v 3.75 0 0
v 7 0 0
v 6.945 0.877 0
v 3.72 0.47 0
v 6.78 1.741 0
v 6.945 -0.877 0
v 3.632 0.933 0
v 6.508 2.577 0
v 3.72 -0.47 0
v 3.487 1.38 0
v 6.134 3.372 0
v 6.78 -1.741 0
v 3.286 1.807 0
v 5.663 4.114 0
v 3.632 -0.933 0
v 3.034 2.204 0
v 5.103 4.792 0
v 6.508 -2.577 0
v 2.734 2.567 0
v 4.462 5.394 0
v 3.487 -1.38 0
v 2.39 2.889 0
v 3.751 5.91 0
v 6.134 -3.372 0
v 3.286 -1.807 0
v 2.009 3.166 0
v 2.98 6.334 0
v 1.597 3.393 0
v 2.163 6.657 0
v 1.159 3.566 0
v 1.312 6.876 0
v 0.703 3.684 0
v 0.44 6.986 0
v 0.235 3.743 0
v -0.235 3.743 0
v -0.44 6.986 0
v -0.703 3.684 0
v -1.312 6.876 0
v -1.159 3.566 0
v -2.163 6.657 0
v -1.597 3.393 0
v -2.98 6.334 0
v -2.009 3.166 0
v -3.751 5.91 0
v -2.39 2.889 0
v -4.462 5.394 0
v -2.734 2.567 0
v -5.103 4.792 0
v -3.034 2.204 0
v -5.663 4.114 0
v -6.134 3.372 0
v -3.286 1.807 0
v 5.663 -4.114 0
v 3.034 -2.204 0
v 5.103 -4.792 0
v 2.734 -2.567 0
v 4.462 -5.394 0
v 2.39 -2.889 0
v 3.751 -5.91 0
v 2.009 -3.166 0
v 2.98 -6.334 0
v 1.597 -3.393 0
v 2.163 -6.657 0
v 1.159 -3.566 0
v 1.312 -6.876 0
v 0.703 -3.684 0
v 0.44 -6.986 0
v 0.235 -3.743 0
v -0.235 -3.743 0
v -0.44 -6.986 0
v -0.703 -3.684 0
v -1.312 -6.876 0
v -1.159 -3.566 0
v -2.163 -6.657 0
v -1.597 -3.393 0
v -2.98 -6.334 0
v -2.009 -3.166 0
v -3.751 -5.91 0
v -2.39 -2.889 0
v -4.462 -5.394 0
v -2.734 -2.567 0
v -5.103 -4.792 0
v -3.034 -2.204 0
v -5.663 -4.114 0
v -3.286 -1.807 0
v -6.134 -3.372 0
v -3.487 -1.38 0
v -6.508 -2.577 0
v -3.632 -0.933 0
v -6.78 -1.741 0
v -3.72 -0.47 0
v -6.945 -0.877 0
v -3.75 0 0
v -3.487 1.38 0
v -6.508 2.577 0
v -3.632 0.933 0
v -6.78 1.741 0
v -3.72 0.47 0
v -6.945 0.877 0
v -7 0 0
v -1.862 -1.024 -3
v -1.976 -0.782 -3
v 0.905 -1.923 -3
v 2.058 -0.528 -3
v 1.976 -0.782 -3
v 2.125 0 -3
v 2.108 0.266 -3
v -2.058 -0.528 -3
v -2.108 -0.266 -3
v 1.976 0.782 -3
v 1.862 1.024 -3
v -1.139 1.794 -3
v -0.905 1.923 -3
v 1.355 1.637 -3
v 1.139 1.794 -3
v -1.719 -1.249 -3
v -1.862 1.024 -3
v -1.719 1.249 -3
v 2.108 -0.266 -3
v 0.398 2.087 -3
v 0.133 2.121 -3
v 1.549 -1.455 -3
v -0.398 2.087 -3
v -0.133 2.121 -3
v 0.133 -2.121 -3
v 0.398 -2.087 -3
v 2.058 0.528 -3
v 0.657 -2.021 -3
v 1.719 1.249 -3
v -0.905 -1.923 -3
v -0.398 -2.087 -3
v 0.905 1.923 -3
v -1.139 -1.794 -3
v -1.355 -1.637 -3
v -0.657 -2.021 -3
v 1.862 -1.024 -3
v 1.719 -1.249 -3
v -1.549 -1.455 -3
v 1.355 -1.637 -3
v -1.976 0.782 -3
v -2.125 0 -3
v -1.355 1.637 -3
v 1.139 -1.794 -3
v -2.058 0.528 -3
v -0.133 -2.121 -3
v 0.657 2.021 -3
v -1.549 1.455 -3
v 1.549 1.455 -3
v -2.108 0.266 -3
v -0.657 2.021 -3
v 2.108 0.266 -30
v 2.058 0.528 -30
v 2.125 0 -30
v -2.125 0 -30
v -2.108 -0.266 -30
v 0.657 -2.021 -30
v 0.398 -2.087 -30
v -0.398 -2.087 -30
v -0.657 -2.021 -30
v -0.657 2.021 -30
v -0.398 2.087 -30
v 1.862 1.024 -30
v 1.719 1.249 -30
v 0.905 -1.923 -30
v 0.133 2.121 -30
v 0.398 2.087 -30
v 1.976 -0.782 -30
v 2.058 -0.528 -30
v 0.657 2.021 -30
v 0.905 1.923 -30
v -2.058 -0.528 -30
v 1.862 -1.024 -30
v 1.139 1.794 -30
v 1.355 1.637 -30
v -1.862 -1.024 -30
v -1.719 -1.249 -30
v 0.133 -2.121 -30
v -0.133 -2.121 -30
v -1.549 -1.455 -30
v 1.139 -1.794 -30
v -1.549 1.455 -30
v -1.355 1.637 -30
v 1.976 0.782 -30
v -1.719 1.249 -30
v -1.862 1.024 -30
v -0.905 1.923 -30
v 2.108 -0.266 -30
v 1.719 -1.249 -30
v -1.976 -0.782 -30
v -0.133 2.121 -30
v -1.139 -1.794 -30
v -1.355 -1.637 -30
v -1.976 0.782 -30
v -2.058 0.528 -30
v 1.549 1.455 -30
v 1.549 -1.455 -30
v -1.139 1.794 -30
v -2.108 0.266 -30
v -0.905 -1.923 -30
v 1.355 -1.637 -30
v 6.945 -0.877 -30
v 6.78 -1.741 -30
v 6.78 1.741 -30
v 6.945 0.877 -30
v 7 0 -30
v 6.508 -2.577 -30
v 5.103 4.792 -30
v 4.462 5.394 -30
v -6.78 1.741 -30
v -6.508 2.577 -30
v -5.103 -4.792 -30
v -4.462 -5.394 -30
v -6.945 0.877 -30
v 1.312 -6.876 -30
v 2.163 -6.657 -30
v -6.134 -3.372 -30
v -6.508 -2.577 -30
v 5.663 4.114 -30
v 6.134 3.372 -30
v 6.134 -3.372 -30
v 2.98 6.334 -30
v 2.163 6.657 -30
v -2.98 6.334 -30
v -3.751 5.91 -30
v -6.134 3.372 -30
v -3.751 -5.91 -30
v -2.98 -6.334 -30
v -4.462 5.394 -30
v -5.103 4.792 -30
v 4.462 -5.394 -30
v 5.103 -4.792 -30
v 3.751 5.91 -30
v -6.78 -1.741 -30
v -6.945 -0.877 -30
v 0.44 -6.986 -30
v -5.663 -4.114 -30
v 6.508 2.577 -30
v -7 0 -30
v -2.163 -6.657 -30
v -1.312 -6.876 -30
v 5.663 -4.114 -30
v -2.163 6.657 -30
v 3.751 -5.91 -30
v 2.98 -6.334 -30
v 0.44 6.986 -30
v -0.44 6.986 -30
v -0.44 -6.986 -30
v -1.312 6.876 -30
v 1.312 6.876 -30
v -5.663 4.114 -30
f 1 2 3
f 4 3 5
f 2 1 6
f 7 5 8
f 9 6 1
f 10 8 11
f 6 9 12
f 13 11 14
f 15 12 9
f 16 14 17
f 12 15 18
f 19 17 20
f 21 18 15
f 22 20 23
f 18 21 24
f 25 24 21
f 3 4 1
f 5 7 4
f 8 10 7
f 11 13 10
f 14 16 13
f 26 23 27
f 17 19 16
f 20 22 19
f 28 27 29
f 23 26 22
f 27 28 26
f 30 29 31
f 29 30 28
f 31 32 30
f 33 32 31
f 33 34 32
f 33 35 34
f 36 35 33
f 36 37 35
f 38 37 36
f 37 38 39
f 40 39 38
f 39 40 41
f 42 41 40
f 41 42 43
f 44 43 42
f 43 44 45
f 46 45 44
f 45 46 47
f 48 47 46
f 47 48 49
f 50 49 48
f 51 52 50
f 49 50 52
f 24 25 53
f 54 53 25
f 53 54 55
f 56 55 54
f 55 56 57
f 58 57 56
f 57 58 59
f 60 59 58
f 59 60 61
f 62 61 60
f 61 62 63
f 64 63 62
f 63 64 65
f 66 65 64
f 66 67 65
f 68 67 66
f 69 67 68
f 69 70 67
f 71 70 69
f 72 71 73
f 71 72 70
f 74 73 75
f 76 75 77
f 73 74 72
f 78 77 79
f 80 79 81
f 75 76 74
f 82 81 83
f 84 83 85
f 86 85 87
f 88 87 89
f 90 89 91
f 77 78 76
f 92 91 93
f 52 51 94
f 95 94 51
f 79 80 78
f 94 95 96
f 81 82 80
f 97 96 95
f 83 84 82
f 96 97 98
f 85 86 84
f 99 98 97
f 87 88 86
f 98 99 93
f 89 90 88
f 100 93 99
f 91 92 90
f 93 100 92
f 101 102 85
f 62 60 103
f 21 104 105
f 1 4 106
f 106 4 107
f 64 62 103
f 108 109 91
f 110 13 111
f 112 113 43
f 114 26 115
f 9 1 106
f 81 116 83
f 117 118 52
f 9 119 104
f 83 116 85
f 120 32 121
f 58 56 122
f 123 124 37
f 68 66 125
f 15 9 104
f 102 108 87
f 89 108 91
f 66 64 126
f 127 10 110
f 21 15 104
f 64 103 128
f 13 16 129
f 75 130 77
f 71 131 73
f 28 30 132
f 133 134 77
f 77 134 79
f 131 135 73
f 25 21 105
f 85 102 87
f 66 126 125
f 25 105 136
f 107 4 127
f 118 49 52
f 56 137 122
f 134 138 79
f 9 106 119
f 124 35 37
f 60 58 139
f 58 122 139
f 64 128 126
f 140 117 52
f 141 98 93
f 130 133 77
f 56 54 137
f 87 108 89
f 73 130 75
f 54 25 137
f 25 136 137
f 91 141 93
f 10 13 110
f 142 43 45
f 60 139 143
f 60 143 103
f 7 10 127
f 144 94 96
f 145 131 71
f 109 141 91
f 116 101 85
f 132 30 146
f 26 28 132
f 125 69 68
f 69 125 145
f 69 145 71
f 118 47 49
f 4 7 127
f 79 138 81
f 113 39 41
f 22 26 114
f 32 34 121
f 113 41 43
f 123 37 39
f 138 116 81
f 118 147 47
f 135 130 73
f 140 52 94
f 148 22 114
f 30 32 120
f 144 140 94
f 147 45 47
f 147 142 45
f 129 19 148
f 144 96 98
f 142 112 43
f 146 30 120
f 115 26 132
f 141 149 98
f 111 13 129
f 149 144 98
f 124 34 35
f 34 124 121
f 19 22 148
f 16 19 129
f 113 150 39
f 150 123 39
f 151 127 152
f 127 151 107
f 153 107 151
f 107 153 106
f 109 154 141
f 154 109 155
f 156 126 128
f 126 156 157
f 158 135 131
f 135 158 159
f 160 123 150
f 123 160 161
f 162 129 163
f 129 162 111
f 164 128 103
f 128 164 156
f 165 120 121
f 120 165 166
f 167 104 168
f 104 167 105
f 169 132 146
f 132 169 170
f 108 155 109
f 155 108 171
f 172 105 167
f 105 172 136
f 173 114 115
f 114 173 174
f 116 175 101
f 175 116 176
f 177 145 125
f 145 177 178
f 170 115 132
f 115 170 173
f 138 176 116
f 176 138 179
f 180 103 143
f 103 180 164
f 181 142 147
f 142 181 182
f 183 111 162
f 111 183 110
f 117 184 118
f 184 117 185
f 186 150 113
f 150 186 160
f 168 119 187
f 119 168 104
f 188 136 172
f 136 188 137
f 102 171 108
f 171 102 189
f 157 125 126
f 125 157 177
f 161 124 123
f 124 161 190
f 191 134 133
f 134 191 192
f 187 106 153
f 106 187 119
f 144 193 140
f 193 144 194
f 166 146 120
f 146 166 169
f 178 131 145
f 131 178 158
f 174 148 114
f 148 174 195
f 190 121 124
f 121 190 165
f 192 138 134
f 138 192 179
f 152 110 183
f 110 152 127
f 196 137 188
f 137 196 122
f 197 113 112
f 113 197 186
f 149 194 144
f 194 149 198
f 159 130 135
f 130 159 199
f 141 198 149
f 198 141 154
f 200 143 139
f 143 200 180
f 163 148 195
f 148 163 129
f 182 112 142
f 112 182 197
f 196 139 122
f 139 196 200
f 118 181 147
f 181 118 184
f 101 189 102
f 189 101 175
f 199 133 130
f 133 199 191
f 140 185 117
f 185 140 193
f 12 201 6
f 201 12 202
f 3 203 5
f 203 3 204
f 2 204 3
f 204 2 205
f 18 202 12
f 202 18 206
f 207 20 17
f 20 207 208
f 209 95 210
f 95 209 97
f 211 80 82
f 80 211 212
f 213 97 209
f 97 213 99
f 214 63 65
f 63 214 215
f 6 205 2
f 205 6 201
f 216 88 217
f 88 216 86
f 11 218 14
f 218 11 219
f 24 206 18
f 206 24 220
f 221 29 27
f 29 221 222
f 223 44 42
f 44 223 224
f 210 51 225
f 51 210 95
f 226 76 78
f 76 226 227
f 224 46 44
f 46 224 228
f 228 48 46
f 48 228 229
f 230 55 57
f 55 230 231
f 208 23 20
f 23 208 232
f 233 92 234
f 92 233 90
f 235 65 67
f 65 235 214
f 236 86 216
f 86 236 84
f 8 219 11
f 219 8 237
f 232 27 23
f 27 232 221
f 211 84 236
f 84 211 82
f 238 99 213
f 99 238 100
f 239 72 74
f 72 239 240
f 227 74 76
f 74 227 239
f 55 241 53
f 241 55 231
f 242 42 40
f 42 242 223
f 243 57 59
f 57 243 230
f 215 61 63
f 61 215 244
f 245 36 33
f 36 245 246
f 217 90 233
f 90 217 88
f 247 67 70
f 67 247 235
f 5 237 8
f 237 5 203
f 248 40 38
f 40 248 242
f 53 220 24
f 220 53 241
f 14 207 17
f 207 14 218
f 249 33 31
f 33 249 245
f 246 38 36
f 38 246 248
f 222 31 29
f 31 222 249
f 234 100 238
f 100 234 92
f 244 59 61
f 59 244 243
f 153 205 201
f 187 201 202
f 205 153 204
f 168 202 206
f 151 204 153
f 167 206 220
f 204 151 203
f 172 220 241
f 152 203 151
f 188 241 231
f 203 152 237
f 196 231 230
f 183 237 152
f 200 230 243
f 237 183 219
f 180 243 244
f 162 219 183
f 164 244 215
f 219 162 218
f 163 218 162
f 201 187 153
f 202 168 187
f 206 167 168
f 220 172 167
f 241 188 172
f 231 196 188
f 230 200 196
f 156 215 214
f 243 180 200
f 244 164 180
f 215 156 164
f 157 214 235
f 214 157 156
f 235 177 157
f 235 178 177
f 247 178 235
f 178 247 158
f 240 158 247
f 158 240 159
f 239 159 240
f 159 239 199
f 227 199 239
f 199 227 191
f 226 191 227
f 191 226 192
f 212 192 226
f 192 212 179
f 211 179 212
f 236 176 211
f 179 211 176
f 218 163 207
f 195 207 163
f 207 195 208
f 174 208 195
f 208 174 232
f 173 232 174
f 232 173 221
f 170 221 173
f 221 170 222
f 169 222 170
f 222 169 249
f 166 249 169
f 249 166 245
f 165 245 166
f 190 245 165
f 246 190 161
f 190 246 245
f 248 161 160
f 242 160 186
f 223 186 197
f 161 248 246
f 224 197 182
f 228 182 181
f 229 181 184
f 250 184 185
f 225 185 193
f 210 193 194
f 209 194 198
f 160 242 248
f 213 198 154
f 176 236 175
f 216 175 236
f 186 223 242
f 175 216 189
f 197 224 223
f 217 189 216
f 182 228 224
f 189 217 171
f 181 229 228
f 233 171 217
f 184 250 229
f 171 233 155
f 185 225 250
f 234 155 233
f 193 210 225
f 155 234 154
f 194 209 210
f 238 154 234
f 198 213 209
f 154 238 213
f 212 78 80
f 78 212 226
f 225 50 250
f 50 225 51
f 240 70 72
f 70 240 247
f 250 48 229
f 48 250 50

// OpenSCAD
$fn = 50;

difference() {
	union() {
		translate(v = [0, 0, -30.0]) {
			cylinder(h = 30, r = 7.0);
		}
	}
	union() {
		translate(v = [0, 0, 0]) {
			rotate(a = [0, 0, 0]) {
				difference() {
					union() {
						translate(v = [0, 0, -33.0]) {
							cylinder(h = 33, r = 2.0);
						}
						translate(v = [0, 0, -3]) {
							cylinder(h = 3, r1 = 2.125, r2 = 3.75);
						}
						translate(v = [0, 0, -33.0]) {
							cylinder(h = 33, r = 2.125);
						}
						translate(v = [0, 0, -33.0]) {
							cylinder(h = 33, r = 2.0);
						}
					}
					union();
				}
			}
		}
	}
}
